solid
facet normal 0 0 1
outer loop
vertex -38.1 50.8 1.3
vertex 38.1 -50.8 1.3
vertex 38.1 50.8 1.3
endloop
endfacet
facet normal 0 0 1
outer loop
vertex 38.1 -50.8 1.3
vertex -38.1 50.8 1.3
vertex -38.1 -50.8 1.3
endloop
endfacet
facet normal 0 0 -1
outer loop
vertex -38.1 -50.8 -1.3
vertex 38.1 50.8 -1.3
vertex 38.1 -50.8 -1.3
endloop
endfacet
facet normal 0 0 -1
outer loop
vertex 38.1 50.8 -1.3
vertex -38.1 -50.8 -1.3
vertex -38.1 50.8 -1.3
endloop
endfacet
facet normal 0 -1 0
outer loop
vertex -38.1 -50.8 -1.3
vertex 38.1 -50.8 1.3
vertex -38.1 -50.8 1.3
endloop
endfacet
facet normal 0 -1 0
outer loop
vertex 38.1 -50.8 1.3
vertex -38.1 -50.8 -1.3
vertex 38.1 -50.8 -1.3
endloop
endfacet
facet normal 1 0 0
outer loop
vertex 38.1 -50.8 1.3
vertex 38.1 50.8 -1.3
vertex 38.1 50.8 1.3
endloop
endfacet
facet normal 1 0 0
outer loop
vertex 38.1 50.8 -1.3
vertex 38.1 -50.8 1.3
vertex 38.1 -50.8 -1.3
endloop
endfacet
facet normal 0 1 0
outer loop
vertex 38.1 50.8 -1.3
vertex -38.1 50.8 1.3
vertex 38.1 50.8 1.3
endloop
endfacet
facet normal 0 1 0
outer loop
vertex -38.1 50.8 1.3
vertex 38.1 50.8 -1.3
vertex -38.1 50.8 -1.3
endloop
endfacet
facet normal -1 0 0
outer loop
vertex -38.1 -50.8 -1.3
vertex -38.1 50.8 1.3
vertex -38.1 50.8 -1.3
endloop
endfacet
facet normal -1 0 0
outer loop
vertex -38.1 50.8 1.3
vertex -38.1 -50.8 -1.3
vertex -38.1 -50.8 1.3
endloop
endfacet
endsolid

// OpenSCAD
//Plate for maintaining orthogonality when measuring material sheets
length = 76.2;
width = 101.6;
height = 2.6;
cube([length,width,height], true);
